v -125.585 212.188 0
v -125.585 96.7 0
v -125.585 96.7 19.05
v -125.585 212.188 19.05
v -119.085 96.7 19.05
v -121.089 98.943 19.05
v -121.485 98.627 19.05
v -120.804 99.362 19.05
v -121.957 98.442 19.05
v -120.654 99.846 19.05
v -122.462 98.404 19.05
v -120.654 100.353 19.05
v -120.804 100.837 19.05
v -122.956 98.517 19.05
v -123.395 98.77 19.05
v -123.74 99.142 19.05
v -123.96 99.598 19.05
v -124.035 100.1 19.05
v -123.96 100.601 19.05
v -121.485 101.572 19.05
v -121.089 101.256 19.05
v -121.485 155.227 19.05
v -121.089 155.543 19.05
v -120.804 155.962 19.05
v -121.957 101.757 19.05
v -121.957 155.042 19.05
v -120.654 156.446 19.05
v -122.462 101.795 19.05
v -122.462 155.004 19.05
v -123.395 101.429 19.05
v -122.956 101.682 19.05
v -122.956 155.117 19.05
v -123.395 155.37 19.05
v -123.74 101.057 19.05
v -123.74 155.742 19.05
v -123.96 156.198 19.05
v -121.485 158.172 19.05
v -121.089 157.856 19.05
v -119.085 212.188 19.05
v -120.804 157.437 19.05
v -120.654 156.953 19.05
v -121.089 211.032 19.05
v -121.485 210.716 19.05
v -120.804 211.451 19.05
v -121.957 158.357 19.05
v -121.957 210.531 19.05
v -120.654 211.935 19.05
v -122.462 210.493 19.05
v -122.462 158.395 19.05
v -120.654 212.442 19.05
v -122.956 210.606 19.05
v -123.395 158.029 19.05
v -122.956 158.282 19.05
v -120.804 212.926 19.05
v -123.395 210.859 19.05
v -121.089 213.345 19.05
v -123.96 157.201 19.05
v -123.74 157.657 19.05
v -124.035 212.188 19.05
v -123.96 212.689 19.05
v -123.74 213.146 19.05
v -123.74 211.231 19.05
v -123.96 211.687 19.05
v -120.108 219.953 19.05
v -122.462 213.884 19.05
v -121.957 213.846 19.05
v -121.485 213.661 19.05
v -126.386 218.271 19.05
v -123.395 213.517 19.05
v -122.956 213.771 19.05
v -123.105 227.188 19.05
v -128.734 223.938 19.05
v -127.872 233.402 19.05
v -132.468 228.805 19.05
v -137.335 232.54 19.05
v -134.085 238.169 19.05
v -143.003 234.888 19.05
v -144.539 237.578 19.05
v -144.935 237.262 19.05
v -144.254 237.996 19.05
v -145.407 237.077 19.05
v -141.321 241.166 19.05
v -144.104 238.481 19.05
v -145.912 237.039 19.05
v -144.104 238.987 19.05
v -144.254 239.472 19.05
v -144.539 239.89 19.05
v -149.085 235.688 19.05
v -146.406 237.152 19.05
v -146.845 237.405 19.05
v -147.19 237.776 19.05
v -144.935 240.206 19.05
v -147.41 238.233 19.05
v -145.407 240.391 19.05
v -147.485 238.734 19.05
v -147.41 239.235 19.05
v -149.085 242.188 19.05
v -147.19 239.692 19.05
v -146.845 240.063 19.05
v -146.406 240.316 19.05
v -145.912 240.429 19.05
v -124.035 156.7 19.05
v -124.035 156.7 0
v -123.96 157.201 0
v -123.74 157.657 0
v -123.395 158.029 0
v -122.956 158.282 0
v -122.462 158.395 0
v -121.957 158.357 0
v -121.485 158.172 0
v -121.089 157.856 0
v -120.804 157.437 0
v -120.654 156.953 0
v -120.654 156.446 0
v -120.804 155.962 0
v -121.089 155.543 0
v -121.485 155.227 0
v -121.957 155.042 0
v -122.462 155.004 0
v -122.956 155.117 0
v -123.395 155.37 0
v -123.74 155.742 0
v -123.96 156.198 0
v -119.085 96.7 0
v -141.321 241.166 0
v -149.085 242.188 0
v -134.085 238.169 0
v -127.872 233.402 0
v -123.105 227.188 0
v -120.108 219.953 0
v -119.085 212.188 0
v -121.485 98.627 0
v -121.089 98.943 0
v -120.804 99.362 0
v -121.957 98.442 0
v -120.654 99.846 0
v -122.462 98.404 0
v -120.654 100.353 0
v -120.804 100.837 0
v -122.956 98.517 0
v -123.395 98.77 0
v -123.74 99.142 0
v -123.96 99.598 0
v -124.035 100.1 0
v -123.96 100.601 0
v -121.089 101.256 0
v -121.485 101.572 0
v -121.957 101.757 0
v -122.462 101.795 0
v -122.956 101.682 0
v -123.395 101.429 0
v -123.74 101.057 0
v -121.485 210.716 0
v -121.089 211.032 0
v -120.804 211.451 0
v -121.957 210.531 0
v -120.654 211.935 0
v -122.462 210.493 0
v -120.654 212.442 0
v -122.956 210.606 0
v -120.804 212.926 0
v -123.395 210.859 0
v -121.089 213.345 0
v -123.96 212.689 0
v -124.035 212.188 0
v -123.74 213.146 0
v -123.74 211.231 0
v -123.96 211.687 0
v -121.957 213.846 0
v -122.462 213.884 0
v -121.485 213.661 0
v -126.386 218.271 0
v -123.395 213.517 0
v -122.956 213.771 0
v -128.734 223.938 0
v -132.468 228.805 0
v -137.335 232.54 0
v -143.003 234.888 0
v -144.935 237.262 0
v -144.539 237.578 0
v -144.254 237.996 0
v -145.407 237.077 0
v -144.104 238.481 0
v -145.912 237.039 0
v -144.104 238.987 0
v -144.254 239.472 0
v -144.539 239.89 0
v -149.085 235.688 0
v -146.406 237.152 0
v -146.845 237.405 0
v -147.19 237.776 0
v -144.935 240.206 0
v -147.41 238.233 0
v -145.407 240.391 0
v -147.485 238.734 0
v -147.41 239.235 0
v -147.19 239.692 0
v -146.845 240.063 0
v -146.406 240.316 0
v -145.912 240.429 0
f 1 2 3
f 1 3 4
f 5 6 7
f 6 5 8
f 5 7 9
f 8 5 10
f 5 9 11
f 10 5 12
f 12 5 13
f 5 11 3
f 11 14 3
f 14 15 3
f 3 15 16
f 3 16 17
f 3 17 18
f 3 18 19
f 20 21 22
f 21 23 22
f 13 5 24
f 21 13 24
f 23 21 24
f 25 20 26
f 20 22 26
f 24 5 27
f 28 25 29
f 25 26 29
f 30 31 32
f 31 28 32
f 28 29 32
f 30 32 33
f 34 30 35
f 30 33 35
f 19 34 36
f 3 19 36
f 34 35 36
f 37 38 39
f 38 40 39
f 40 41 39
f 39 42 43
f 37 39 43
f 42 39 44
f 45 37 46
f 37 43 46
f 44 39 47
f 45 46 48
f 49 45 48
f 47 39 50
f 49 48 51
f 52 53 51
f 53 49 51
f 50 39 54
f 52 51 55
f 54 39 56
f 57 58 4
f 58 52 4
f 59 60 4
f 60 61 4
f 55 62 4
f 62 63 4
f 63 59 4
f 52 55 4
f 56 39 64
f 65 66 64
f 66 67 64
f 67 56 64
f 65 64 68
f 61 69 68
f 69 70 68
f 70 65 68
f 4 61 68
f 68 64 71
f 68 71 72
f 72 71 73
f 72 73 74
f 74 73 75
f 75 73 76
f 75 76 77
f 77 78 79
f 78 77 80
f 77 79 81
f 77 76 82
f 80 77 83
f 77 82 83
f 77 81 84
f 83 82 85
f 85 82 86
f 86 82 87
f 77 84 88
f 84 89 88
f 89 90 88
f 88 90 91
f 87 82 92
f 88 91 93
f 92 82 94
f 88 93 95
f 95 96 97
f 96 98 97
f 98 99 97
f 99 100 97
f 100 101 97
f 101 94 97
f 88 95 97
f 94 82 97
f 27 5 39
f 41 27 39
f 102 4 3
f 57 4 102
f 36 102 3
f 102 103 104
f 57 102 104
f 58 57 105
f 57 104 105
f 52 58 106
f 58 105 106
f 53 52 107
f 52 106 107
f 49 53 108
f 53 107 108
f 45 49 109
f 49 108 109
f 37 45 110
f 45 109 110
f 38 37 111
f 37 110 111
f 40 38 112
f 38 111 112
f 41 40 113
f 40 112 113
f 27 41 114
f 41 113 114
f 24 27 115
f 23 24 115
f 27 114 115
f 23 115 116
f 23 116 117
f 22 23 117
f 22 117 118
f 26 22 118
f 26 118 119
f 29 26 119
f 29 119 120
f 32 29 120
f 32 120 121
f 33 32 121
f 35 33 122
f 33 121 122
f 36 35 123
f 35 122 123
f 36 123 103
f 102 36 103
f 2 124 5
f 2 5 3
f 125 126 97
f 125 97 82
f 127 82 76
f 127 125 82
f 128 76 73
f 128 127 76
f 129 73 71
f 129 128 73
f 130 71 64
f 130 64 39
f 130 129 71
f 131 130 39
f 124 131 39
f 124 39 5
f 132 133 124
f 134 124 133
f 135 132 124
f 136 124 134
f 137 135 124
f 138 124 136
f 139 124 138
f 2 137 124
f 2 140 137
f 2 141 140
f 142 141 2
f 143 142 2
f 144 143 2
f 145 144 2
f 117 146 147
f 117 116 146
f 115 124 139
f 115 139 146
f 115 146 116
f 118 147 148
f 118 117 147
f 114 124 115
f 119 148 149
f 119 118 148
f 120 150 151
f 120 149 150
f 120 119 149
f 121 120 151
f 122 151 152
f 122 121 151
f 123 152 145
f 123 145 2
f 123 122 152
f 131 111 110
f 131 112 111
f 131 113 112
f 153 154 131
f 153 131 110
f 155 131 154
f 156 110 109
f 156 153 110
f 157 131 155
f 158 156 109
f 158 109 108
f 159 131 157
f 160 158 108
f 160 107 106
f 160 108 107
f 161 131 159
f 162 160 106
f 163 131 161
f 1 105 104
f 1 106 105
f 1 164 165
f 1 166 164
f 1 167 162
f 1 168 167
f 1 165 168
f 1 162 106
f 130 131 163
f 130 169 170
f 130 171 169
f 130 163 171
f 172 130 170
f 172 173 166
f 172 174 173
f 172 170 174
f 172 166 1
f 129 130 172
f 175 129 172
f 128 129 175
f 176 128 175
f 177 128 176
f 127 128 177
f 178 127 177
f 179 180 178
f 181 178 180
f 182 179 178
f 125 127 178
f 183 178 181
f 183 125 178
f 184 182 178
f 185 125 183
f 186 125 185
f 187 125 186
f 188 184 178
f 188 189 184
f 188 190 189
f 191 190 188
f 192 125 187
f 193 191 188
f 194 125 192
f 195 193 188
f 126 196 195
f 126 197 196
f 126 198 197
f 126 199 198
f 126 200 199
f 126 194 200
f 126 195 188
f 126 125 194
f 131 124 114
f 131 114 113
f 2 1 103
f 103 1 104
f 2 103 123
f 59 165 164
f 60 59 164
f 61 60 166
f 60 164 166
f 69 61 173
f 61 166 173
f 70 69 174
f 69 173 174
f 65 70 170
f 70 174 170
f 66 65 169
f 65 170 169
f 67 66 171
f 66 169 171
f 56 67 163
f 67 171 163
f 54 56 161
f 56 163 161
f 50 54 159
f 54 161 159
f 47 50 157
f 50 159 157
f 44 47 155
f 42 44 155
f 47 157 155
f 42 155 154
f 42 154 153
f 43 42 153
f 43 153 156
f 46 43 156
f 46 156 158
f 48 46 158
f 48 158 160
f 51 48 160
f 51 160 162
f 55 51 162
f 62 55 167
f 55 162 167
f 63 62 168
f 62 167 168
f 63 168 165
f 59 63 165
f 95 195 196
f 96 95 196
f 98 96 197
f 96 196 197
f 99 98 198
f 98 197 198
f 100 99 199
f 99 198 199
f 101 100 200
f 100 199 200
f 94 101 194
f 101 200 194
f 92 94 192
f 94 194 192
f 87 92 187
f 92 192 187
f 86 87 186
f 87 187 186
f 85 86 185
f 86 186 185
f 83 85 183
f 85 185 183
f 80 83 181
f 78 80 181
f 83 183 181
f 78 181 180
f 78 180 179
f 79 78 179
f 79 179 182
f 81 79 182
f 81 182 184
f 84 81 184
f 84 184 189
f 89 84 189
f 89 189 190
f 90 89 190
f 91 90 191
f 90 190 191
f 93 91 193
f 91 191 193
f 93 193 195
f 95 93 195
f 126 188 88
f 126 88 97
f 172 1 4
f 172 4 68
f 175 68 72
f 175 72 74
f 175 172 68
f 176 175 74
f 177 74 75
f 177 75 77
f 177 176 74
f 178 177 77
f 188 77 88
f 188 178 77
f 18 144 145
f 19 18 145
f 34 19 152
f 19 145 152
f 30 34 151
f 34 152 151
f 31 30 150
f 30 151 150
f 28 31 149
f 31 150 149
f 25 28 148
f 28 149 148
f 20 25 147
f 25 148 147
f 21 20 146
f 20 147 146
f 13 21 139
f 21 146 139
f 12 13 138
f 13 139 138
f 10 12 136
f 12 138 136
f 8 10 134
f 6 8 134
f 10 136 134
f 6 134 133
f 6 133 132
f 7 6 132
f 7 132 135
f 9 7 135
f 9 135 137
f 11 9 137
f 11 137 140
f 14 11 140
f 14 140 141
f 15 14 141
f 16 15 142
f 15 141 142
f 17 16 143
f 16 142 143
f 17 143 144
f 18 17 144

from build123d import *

# Parameters (mm, degrees)
SKETCH1_R           = 1.7
BOSS_EXTRUDE1_DEPTH = 19.05


with BuildPart() as part:
    # Sketch1 → Boss-Extrude1 (new body)
    with BuildSketch(Plane(origin=(0, 0, 0), x_dir=(-1, 0, 0), z_dir=(0, 0, -1))):
        with BuildLine():
            Line((149.085368151, 235.688334746), (149.085368151, 242.188334746))
            ThreePointArc((149.085368151, 242.188334746), (127.872164715, 233.401538181), (119.085368151, 212.188334746))
            Line((119.085368151, 212.188334746), (119.085368151, 96.699570281))
            Line((119.085368151, 96.699570281), (125.585368151, 96.699570281))
            Line((125.585368151, 96.699570281), (125.585368151, 212.188334746))
            ThreePointArc((125.585368151, 212.188334746), (132.468358793, 228.805344103), (149.085368151, 235.688334746))
        make_face()
        with Locations((145.785368151, 238.734002942)):
            Circle(SKETCH1_R, mode=Mode.SUBTRACT)
        with Locations((122.335368151, 212.188334746)):
            Circle(SKETCH1_R, mode=Mode.SUBTRACT)
        with Locations((122.335368151, 156.699570281)):
            Circle(SKETCH1_R, mode=Mode.SUBTRACT)
        with Locations((122.335368151, 100.099570281)):
            Circle(SKETCH1_R, mode=Mode.SUBTRACT)
    extrude(amount=-BOSS_EXTRUDE1_DEPTH)


solid = part.part
